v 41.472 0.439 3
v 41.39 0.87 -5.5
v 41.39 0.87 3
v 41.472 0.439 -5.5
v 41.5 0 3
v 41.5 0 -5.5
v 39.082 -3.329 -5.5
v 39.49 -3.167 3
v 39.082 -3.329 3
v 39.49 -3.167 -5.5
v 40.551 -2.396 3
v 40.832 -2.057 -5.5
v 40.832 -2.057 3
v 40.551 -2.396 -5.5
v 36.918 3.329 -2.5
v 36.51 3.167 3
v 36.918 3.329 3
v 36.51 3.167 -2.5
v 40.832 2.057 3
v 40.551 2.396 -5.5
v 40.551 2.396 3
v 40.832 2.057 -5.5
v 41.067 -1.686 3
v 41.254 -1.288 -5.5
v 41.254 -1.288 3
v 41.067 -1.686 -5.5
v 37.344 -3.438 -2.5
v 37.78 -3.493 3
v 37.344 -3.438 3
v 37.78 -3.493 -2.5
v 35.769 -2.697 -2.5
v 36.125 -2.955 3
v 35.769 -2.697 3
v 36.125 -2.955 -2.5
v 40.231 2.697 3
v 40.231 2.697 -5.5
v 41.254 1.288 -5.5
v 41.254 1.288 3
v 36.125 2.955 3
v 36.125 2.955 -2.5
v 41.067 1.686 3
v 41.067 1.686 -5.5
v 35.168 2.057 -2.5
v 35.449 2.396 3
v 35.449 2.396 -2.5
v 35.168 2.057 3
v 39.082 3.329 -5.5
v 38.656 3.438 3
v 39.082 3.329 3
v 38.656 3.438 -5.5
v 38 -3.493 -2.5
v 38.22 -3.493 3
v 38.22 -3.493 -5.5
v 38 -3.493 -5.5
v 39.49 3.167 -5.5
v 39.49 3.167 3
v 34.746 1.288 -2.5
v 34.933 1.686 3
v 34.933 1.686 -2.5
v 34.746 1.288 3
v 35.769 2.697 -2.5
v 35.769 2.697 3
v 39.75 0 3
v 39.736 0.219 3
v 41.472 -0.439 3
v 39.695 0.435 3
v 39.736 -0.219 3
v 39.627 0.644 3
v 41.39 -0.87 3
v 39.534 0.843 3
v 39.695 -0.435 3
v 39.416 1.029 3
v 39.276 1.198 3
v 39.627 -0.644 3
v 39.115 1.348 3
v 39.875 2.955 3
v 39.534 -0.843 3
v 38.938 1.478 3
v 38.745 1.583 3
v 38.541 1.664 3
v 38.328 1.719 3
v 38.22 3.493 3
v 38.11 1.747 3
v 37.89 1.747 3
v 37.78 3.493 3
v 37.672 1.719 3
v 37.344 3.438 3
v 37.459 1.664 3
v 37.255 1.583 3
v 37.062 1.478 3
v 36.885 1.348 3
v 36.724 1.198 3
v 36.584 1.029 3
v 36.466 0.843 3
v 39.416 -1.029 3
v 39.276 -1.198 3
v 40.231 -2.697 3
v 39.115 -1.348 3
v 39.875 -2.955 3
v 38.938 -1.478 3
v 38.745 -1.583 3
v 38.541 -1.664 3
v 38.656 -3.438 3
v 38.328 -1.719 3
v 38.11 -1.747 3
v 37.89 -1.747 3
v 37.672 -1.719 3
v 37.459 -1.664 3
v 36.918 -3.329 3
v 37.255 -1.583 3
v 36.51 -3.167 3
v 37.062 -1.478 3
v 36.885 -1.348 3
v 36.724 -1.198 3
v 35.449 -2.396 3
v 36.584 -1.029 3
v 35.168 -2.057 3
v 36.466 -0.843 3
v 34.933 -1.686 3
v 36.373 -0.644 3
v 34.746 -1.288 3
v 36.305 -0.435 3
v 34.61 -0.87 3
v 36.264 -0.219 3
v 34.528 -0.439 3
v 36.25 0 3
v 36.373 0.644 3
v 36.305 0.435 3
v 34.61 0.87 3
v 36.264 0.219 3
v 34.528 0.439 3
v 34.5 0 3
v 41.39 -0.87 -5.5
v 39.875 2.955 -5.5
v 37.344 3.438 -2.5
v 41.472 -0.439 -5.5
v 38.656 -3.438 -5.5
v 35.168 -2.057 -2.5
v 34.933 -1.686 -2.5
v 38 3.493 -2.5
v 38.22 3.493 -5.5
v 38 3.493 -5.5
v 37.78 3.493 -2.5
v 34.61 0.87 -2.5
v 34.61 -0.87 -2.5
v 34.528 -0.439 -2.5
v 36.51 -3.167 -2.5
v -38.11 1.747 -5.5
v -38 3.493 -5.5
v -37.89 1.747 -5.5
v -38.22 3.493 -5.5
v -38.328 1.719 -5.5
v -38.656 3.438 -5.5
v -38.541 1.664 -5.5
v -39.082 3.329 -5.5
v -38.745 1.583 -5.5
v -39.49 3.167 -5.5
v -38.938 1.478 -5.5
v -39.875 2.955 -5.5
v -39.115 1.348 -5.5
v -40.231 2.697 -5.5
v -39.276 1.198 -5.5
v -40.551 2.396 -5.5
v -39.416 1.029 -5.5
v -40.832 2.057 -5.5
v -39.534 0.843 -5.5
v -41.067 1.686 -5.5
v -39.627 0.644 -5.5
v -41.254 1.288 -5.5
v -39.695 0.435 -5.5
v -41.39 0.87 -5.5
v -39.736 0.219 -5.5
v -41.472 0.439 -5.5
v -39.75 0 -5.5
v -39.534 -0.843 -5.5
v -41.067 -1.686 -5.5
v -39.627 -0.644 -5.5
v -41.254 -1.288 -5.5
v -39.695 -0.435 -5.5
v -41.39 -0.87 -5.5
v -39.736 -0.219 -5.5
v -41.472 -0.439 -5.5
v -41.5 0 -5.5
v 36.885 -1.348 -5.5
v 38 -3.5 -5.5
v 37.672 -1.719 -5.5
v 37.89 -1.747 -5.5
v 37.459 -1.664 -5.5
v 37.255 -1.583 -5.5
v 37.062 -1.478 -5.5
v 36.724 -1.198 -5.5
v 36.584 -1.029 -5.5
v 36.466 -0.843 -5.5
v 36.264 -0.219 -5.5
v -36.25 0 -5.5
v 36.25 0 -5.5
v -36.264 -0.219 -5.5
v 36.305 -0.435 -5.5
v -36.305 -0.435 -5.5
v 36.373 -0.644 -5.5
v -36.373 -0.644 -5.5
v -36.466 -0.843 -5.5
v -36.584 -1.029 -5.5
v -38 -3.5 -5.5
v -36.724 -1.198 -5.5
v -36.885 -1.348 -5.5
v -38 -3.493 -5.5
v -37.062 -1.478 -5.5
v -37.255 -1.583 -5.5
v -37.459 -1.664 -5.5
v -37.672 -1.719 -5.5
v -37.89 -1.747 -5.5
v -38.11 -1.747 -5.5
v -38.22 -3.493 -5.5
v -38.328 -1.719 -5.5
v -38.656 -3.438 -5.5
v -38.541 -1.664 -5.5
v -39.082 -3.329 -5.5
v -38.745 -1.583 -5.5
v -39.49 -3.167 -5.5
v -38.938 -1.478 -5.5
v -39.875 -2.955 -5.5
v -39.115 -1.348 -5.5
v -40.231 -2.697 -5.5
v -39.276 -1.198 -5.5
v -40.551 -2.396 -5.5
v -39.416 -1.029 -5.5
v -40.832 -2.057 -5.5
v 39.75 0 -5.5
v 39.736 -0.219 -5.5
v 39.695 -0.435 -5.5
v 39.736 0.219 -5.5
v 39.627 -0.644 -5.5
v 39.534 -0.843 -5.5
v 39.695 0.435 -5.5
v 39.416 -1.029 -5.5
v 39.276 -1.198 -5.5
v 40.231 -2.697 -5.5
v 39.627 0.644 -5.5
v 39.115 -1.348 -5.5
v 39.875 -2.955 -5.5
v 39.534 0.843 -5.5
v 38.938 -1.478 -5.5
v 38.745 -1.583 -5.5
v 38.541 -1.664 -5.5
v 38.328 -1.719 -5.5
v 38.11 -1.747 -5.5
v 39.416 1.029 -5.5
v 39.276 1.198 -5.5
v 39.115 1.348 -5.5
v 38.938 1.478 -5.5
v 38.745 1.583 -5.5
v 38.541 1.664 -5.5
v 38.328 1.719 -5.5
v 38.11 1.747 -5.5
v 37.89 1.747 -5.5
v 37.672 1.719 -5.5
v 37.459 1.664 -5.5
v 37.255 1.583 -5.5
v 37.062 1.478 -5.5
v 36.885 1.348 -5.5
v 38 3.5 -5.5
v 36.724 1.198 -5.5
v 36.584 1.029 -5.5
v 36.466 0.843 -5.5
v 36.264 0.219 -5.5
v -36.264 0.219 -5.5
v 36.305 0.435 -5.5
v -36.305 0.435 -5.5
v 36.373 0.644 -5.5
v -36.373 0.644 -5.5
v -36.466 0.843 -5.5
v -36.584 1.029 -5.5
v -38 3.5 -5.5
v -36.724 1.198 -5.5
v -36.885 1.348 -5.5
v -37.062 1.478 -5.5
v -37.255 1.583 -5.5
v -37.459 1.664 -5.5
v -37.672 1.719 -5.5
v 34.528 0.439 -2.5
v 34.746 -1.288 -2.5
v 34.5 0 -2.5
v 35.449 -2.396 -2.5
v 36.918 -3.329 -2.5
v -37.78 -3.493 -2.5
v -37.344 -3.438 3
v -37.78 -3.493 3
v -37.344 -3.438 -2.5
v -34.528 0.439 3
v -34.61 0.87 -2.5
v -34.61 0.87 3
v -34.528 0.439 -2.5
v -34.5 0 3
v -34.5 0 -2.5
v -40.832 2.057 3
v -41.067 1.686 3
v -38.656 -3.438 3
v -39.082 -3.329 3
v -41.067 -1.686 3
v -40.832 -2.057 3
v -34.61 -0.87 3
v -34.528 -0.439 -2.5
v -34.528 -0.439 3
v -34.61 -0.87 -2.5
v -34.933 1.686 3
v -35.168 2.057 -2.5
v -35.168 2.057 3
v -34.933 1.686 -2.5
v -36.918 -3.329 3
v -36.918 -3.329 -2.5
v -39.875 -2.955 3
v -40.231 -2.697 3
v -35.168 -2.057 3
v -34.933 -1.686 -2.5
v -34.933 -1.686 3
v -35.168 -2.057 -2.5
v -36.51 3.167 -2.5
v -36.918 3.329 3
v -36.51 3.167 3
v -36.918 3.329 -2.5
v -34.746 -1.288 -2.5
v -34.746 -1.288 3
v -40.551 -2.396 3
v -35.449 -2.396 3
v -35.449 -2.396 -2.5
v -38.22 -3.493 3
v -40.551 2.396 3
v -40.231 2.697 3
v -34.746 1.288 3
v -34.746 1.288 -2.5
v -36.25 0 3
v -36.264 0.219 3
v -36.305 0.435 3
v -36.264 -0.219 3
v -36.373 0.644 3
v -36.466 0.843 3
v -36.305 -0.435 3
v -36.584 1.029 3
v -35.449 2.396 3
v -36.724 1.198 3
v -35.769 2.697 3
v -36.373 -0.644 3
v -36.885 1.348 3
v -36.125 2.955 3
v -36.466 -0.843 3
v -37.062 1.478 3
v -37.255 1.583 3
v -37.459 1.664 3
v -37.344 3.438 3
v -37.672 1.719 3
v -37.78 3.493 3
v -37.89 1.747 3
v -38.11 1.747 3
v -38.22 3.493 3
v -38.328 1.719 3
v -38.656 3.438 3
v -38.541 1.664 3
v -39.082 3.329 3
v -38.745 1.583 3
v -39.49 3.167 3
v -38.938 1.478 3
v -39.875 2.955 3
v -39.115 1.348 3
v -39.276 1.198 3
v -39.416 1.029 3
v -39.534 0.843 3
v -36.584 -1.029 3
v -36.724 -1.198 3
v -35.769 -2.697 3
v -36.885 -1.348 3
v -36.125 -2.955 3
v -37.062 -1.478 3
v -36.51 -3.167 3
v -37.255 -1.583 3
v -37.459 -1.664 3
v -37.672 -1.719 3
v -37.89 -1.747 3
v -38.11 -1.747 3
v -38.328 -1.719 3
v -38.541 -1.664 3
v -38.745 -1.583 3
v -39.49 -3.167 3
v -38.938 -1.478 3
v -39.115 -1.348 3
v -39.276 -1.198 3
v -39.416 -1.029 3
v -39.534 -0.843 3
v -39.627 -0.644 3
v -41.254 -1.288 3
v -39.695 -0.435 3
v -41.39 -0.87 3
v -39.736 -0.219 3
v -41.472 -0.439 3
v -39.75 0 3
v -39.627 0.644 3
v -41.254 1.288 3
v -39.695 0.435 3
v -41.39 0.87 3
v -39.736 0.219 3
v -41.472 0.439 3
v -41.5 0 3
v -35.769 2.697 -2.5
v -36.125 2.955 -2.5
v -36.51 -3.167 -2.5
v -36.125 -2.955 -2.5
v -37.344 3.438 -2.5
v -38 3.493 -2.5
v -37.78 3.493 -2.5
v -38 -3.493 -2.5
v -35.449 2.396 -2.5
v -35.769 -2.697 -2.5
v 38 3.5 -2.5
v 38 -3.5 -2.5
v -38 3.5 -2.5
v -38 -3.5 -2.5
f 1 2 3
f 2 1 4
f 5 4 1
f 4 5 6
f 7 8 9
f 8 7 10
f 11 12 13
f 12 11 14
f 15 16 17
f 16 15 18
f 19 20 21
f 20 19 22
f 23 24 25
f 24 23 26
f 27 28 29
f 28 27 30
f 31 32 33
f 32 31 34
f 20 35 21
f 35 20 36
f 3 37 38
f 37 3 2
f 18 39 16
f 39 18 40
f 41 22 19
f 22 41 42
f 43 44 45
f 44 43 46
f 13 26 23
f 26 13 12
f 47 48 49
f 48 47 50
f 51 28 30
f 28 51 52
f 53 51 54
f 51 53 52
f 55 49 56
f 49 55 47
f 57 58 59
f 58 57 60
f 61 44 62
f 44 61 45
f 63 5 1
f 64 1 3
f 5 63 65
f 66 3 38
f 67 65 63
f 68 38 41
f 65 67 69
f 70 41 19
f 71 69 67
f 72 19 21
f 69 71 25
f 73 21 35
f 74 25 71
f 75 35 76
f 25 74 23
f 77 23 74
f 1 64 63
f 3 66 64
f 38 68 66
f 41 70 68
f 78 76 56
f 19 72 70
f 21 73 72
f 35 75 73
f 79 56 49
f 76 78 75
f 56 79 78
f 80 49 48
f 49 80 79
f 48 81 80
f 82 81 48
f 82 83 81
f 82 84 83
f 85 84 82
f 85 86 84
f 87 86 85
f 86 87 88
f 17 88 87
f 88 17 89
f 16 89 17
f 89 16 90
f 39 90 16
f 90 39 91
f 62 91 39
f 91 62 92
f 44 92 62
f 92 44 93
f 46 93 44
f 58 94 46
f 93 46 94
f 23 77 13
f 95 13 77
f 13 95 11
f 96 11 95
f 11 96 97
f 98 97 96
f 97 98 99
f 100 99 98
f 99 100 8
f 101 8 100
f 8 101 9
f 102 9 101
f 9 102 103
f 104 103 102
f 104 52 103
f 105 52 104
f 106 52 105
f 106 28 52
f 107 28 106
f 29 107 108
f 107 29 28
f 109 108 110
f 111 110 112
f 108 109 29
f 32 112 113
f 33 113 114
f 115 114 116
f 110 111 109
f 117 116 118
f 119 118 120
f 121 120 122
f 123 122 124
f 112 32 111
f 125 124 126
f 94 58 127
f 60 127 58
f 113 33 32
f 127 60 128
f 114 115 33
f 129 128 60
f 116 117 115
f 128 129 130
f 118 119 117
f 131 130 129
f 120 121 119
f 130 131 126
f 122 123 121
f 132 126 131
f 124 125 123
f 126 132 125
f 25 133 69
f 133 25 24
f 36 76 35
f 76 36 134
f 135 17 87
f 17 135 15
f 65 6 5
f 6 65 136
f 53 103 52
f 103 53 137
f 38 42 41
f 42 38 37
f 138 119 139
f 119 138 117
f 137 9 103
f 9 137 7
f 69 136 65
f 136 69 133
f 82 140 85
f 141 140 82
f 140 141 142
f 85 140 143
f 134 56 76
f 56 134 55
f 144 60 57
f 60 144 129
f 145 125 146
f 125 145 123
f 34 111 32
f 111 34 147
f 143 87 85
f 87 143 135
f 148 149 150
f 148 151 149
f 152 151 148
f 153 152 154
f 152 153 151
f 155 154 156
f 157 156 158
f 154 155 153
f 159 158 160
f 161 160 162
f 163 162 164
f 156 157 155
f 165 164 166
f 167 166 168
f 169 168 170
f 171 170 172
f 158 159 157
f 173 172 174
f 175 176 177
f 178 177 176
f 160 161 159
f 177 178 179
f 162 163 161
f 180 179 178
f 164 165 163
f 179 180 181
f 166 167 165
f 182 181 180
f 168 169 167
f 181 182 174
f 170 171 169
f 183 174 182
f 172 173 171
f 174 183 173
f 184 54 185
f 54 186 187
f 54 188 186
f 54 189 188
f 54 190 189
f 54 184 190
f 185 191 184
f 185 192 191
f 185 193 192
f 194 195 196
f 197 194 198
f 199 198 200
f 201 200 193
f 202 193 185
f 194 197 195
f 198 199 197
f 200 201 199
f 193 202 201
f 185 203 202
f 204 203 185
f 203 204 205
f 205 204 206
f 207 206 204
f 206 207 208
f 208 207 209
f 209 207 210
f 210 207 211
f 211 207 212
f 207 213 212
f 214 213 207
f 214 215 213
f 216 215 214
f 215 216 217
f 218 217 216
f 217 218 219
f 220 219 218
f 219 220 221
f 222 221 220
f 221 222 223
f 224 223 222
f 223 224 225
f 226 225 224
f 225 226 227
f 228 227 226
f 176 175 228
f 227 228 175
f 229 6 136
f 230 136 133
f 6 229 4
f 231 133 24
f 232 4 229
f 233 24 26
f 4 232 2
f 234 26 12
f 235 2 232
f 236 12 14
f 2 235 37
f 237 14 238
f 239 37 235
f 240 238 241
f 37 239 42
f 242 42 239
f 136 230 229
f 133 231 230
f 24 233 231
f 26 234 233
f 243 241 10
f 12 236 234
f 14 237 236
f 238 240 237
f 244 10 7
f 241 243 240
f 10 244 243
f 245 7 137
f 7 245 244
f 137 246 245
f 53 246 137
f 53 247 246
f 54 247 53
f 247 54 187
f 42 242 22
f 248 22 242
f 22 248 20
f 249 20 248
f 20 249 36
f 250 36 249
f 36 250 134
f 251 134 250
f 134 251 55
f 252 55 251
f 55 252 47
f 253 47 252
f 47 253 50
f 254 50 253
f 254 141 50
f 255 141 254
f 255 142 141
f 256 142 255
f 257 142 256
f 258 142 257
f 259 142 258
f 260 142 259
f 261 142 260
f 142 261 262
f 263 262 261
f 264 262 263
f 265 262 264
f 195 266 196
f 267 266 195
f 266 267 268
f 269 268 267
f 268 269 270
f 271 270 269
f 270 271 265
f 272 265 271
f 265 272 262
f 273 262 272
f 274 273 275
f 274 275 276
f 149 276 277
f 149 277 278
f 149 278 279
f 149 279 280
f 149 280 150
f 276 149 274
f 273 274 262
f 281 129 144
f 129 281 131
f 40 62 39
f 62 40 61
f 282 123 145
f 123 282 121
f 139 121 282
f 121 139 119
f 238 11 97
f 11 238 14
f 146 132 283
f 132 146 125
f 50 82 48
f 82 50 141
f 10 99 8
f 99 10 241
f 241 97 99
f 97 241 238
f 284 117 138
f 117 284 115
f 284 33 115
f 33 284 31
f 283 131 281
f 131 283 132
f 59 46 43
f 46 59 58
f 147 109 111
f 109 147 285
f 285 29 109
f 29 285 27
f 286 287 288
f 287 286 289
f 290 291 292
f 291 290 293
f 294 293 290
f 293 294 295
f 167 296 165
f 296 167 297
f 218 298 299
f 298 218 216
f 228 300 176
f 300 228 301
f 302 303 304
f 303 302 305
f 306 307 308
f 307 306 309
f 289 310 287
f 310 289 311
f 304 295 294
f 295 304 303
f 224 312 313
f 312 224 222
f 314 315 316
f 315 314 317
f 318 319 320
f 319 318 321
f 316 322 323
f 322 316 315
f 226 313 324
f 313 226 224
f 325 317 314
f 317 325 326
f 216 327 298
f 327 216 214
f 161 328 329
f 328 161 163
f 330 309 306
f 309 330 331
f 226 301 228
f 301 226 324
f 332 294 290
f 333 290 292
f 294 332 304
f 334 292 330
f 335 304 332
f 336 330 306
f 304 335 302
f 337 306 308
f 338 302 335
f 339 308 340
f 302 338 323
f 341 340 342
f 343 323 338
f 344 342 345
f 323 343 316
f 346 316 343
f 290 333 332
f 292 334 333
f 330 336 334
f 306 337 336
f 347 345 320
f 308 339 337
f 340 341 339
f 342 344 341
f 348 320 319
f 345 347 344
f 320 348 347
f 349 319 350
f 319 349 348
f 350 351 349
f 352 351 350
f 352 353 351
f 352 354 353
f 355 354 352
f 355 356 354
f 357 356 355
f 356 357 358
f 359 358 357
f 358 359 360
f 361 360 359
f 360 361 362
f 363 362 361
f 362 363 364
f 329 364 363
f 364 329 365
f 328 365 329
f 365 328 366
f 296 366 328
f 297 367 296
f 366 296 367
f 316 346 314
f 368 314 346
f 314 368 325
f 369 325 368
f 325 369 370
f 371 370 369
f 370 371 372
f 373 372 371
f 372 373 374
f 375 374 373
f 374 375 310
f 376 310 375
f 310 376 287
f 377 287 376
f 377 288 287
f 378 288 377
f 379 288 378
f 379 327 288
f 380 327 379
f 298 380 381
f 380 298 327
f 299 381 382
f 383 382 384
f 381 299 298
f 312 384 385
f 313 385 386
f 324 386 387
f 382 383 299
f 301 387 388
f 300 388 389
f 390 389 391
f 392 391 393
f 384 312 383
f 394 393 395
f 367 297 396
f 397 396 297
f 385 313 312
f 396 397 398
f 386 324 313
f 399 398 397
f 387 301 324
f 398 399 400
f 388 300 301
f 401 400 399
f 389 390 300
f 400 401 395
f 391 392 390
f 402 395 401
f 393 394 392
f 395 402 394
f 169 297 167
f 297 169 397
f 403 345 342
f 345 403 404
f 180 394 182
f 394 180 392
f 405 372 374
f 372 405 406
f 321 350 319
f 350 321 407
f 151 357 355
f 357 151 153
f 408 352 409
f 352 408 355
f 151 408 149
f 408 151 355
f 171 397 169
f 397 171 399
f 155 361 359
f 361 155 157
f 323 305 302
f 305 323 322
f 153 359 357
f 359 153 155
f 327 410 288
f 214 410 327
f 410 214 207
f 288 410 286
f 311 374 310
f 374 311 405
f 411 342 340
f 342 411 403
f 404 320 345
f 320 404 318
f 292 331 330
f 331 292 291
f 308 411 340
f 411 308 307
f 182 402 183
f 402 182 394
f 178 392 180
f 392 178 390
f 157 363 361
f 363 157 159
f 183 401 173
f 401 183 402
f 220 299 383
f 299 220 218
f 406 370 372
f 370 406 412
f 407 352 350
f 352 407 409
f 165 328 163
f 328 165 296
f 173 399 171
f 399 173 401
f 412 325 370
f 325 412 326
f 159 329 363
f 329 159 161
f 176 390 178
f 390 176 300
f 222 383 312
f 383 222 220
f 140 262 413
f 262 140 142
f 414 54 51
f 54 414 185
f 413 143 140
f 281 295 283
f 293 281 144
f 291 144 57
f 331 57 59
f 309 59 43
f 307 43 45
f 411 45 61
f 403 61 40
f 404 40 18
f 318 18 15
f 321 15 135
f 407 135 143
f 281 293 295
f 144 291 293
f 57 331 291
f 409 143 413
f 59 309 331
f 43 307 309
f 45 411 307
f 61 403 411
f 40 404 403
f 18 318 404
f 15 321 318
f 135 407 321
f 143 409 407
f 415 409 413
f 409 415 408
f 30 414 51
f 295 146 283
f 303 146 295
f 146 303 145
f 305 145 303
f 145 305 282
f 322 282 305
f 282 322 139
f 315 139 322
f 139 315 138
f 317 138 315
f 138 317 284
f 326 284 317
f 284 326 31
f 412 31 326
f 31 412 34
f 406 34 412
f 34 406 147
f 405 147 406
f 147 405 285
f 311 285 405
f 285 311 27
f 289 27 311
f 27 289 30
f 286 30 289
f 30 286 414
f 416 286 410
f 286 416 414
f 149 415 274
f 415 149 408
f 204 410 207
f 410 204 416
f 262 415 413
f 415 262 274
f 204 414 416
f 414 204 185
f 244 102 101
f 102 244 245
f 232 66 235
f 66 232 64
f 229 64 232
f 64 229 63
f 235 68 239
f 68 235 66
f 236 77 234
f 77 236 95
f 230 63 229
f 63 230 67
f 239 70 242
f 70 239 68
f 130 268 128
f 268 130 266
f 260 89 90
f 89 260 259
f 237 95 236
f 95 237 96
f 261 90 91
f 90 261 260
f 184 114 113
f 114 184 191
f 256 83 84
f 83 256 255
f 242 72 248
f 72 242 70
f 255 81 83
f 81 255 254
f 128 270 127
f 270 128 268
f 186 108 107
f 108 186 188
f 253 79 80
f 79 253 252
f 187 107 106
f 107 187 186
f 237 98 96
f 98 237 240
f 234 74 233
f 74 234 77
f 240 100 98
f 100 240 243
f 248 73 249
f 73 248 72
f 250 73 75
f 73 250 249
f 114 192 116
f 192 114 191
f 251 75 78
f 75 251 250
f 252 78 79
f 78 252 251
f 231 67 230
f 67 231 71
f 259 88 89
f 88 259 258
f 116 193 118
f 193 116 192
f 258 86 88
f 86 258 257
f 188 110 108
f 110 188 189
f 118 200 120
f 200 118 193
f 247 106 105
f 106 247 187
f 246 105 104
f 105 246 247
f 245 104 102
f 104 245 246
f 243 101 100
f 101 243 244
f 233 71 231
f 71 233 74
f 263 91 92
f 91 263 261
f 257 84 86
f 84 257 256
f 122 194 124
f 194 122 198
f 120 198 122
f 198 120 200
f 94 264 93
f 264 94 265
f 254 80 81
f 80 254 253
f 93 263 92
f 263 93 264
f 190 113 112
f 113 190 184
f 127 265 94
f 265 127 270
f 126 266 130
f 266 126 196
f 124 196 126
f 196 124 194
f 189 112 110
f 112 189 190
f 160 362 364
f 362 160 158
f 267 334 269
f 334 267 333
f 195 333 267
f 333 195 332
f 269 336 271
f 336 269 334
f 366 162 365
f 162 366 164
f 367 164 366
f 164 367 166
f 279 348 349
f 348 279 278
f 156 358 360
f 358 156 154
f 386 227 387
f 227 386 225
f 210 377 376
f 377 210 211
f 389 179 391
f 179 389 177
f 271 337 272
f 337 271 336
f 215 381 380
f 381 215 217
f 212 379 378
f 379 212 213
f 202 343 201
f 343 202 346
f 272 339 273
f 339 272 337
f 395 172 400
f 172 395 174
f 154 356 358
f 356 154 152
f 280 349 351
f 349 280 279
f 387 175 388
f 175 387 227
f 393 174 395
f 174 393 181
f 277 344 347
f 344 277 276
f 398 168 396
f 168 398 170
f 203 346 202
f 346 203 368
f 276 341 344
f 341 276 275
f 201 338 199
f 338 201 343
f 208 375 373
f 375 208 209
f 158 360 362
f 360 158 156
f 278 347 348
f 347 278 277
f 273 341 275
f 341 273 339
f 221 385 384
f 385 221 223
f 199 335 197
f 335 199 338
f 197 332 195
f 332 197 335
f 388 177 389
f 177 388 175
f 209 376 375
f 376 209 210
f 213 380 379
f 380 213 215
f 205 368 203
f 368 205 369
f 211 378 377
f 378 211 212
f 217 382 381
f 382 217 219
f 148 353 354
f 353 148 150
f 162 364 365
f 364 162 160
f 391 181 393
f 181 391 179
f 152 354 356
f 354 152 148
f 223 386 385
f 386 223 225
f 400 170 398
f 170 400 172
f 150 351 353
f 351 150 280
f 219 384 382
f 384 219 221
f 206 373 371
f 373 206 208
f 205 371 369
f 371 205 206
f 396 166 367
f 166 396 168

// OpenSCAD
difference()
{
    union(){
        translate([76/2,0,-5.5])
            cylinder(d=7,8.5, $fn=50);

        translate([-76/2,0,-5.5])
            cylinder(d=7,8.5, $fn=50);

        translate([0,0,-4])
            cube([76,7,3],center=true);
        
        
    }
    
    translate([76/2,0,-10])
        cylinder(d=3.5, 20, $fn=50);
        
    translate([-76/2,0,-10])
        cylinder(d=3.5, 20, $fn=50);
    
}
